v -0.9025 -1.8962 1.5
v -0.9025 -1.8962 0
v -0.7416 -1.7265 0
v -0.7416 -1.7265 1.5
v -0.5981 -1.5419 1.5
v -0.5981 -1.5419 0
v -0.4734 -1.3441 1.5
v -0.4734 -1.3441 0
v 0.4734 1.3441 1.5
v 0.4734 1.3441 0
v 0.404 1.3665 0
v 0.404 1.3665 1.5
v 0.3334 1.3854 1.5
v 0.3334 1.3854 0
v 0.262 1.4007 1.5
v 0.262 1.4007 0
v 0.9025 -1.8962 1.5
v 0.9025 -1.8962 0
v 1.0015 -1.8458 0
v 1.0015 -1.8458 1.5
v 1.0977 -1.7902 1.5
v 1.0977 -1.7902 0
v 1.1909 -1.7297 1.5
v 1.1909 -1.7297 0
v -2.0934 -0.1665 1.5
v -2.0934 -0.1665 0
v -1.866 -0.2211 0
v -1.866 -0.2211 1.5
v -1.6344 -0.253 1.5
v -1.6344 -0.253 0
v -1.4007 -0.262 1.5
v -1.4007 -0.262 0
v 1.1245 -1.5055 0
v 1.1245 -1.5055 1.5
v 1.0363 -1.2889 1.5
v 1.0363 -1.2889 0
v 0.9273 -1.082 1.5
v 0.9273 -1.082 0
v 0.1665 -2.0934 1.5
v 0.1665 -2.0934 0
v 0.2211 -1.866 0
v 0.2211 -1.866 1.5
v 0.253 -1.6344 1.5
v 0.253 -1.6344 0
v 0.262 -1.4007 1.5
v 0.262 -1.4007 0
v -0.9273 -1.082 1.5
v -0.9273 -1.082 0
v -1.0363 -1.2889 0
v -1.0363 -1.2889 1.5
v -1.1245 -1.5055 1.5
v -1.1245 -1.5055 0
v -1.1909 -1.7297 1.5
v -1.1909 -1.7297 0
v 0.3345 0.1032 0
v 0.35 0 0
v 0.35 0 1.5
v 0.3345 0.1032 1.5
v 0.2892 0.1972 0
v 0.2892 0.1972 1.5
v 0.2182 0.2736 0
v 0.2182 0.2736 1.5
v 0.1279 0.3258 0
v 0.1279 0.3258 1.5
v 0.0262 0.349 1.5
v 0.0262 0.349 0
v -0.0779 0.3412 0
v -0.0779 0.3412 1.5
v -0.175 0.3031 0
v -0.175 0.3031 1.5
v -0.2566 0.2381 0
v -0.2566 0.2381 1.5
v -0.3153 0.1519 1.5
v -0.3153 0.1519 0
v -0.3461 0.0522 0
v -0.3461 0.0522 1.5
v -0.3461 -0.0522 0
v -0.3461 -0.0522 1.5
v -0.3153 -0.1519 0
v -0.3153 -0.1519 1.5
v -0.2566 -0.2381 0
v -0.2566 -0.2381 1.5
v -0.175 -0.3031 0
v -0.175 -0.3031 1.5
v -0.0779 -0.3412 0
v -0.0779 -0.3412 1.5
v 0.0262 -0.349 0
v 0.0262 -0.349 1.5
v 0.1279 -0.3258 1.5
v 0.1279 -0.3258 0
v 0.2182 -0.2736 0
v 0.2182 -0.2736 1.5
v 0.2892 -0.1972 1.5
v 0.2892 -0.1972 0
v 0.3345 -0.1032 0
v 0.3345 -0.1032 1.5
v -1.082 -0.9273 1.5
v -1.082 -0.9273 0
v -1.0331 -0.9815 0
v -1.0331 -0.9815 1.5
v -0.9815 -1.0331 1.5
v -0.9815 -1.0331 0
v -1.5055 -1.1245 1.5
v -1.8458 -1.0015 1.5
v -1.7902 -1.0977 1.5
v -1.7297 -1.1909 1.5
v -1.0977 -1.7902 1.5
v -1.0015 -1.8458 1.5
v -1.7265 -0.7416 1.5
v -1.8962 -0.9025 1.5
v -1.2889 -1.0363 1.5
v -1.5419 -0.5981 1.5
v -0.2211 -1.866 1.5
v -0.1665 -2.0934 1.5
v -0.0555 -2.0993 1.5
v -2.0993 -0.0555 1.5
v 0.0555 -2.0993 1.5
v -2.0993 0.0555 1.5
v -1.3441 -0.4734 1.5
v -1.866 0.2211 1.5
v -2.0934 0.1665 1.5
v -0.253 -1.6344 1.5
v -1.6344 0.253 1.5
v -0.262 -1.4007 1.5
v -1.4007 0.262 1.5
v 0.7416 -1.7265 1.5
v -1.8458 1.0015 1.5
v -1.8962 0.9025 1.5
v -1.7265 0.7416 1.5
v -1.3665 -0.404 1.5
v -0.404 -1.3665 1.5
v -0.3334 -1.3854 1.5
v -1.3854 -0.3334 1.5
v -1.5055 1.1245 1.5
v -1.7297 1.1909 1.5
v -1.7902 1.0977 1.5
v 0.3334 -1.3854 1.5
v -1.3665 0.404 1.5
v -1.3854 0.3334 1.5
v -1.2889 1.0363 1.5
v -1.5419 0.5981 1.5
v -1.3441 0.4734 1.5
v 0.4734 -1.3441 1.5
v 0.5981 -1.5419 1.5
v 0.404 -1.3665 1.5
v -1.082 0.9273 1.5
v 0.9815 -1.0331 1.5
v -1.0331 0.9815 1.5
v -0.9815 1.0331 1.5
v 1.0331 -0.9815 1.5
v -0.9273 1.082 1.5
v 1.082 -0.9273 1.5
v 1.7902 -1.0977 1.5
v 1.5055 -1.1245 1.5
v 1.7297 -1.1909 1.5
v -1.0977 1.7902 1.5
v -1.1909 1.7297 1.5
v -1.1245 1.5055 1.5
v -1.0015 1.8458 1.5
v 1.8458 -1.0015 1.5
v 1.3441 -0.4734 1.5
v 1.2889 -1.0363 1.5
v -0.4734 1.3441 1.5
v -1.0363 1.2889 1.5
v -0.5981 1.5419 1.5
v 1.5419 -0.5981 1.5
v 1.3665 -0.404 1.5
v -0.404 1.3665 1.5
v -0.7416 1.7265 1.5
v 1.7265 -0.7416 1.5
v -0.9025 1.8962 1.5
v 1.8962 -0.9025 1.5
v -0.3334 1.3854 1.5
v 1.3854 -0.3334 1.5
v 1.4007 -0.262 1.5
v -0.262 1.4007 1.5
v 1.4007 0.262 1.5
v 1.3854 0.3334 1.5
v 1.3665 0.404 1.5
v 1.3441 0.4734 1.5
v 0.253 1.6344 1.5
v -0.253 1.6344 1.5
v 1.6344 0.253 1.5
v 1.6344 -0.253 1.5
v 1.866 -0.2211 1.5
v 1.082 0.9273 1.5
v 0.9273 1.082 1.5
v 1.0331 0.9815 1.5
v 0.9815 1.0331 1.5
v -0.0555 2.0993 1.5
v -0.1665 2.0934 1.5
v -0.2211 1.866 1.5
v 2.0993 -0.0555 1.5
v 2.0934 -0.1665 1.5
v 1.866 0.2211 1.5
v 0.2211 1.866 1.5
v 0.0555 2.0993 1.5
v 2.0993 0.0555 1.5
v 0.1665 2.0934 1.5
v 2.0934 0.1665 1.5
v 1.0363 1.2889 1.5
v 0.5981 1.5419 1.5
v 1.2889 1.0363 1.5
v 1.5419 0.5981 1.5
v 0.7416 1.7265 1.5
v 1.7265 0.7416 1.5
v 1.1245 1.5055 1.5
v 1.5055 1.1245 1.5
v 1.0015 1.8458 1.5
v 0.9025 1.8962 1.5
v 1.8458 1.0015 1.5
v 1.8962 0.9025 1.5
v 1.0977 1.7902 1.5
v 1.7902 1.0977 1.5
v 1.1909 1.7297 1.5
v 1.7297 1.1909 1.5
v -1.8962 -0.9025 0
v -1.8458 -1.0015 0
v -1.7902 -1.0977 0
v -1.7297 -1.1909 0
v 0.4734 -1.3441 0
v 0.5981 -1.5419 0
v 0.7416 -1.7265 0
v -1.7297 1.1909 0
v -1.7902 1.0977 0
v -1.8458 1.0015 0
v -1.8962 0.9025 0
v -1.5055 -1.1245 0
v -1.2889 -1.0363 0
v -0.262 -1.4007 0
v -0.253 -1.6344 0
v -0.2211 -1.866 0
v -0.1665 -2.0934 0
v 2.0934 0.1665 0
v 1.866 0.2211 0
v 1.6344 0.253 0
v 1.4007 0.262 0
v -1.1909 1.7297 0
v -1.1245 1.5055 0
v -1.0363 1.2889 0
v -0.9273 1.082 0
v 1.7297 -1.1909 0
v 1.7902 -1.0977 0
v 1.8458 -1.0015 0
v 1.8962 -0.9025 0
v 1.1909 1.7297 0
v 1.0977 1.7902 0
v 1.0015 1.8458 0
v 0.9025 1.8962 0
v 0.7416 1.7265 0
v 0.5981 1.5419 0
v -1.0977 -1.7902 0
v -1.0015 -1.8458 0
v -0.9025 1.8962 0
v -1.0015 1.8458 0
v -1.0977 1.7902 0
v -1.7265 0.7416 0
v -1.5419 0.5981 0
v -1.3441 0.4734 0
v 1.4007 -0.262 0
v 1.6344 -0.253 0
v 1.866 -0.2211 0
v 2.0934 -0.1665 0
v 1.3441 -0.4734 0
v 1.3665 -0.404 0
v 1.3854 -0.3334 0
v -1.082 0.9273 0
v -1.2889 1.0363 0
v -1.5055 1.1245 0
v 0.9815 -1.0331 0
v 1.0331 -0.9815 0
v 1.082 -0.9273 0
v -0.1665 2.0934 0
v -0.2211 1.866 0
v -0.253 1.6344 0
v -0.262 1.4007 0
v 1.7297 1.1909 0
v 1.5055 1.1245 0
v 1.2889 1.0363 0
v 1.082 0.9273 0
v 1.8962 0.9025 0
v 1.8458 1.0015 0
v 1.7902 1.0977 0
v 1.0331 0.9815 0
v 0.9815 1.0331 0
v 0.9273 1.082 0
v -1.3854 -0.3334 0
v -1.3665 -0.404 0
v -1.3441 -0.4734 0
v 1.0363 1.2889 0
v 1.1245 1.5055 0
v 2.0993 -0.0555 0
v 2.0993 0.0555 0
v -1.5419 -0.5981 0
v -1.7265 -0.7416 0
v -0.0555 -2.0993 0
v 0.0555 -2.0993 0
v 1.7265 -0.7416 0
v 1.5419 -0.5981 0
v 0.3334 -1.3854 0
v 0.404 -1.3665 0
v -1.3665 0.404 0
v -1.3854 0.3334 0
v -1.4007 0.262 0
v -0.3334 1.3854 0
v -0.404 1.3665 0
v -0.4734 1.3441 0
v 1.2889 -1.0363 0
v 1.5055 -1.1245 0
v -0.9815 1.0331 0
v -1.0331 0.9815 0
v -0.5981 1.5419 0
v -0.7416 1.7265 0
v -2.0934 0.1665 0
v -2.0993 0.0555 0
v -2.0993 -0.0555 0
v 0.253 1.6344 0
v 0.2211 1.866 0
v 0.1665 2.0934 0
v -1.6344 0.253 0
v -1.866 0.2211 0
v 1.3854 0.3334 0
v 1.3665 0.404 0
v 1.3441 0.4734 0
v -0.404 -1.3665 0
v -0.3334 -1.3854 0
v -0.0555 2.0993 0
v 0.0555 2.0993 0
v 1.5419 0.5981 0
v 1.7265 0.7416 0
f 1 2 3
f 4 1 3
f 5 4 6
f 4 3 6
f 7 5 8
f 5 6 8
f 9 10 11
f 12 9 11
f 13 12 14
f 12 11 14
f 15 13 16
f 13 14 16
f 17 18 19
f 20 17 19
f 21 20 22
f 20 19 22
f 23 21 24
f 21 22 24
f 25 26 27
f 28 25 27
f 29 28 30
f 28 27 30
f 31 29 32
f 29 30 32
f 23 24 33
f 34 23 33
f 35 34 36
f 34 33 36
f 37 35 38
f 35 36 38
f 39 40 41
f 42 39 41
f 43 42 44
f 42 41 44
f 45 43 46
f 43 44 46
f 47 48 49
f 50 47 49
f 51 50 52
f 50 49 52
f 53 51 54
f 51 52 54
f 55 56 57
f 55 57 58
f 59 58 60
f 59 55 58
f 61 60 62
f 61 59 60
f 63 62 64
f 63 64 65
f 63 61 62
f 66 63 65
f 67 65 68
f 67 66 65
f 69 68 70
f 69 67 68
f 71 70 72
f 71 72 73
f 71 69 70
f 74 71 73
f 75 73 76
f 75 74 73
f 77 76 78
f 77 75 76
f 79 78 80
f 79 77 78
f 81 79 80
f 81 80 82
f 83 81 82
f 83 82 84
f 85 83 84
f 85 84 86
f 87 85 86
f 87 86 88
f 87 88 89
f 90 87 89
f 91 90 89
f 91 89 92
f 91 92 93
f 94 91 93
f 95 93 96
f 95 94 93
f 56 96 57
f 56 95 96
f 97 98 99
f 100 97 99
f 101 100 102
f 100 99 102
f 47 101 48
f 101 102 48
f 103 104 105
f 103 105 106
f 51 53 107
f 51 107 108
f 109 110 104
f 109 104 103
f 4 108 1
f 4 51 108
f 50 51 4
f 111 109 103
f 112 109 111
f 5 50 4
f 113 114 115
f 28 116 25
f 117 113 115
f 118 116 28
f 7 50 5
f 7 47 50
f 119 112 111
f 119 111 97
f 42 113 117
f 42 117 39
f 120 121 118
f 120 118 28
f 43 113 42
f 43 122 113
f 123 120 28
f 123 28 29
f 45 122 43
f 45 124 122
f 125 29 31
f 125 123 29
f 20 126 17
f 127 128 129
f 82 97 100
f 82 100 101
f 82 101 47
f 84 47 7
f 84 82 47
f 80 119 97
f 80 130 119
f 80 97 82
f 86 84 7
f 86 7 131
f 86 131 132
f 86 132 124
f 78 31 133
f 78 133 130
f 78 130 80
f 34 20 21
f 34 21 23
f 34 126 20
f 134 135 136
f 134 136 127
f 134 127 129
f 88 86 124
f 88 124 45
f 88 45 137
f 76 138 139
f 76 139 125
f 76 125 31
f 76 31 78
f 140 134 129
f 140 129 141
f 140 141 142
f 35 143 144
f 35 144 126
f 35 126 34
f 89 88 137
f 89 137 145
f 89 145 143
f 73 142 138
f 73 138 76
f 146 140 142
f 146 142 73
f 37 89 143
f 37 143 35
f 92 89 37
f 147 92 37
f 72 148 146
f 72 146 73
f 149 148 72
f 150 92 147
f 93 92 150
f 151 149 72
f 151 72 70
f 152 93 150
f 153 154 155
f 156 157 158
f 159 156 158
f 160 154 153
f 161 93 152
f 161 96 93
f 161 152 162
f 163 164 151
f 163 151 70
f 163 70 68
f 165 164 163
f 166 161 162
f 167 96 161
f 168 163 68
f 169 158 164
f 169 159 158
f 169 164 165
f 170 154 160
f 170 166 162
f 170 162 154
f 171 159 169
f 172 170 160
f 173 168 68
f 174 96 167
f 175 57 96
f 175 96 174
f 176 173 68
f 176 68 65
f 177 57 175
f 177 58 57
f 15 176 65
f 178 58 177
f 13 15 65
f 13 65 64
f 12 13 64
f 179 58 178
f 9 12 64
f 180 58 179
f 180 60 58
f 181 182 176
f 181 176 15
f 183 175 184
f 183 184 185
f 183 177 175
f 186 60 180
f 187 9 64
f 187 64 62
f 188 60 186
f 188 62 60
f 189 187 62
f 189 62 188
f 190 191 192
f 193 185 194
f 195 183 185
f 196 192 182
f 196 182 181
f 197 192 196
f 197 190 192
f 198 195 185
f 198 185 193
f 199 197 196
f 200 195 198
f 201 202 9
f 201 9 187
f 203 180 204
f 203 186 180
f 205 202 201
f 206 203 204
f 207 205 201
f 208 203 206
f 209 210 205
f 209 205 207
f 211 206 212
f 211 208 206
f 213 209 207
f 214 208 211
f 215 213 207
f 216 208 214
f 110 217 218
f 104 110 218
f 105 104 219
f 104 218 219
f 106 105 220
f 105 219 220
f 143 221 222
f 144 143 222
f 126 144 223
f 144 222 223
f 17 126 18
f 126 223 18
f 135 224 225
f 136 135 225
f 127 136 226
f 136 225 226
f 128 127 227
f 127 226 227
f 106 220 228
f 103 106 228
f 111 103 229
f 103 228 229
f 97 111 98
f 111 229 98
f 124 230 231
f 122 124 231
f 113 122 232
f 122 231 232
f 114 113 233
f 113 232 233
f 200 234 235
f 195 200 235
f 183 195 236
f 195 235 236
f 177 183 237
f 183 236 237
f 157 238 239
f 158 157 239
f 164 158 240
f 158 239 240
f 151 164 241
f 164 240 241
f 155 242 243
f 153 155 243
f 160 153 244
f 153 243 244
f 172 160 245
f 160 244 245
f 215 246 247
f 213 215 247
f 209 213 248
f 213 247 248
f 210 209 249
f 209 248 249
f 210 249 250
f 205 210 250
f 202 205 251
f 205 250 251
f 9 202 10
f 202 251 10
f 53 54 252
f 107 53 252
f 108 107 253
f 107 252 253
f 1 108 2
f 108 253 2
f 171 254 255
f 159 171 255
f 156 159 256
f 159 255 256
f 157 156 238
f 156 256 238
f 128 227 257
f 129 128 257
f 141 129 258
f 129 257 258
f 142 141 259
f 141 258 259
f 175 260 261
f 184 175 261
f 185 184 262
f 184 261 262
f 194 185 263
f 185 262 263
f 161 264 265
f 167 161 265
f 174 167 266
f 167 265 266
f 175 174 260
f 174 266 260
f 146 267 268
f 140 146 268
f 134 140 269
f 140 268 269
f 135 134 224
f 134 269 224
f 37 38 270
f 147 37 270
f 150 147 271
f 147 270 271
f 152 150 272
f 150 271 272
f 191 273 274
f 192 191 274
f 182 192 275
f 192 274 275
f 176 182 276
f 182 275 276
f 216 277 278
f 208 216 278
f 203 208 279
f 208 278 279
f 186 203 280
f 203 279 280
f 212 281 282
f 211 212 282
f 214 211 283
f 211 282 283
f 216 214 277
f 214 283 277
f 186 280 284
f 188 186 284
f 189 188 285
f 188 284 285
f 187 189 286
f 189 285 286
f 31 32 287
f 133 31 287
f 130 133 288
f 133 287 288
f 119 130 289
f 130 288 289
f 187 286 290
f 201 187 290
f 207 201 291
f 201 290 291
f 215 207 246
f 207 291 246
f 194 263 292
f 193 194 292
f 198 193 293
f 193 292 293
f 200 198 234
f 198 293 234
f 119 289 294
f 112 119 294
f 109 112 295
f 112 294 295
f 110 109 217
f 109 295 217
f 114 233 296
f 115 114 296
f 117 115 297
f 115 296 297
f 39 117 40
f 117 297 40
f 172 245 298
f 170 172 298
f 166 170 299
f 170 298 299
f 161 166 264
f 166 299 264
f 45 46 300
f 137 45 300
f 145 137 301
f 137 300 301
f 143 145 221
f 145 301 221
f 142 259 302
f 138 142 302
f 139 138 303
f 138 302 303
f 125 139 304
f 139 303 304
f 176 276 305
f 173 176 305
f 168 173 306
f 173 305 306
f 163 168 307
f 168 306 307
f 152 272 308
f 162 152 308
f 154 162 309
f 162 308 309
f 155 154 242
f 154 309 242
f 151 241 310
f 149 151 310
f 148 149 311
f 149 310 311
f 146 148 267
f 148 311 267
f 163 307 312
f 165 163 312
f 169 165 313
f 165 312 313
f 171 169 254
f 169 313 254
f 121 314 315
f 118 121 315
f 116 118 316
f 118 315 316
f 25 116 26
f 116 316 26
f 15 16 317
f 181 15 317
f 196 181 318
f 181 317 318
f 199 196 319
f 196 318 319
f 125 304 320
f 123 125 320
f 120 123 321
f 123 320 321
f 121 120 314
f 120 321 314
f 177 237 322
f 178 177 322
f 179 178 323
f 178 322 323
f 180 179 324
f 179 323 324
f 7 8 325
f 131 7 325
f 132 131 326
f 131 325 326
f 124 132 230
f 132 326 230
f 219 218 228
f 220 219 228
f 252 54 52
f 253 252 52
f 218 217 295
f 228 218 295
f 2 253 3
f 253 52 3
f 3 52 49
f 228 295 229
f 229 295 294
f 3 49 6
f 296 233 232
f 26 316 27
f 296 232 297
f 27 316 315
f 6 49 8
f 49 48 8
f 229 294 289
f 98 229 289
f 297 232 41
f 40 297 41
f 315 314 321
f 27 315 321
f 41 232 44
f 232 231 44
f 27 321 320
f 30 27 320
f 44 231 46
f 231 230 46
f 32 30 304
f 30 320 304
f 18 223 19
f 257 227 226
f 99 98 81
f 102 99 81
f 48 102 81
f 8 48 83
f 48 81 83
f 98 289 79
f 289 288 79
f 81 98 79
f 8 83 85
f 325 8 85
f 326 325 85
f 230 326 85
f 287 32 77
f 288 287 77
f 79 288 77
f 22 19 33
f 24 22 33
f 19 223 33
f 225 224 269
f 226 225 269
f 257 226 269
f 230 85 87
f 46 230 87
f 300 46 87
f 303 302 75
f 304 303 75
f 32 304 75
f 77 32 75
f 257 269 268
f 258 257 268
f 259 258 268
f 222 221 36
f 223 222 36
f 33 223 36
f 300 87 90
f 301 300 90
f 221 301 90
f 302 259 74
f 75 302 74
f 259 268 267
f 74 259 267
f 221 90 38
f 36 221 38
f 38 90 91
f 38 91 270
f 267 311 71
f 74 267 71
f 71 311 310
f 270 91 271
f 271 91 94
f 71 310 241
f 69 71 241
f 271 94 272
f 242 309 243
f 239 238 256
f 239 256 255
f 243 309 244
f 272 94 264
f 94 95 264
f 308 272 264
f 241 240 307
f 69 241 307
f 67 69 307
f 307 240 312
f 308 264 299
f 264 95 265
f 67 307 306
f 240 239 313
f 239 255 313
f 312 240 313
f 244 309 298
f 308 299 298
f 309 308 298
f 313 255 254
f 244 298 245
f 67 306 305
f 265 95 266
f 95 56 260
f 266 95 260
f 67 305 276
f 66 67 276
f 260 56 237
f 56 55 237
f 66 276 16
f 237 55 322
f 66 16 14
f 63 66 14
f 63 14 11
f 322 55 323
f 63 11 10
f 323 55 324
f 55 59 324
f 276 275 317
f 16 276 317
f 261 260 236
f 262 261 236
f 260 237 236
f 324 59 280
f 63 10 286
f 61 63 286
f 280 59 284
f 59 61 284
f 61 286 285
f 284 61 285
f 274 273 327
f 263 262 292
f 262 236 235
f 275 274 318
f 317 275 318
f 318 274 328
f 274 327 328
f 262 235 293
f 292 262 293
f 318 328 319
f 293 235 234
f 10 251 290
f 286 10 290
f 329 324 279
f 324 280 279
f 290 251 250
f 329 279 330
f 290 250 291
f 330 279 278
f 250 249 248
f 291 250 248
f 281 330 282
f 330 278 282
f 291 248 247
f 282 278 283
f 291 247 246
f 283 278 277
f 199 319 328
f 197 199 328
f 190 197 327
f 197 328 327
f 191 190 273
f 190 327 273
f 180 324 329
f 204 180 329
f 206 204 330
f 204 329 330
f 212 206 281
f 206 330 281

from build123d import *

# Parameters (mm, degrees)
SKETCH_1_R      = 0.35
EXTRUDE_1_DEPTH = 1.5


with BuildPart() as part:
    # 스케치1 → 보스-돌출1 (new body)
    with BuildSketch(Plane.XY):
        with BuildLine():
            ThreePointArc((-0.166490254, 2.093389834), (-0.239891186, 1.750579573), (-0.262040986, 1.400699654))
            ThreePointArc((-0.262040986, 1.400699654), (-0.368817139, 1.376444302), (-0.473415677, 1.344061977))
            ThreePointArc((-0.473415677, 1.344061977), (-0.667537925, 1.635991975), (-0.902510127, 1.896173903))
            ThreePointArc((-0.902510127, 1.896173903), (-1.05, 1.818653348), (-1.190879707, 1.729683649))
            ThreePointArc((-1.190879707, 1.729683649), (-1.083041648, 1.396100789), (-0.927283978, 1.082020991))
            ThreePointArc((-0.927283978, 1.082020991), (-1.007627163, 1.007627163), (-1.082020991, 0.927283978))
            ThreePointArc((-1.082020991, 0.927283978), (-1.396100789, 1.083041648), (-1.729683649, 1.190879707))
            ThreePointArc((-1.729683649, 1.190879707), (-1.818653348, 1.05), (-1.896173903, 0.902510127))
            ThreePointArc((-1.896173903, 0.902510127), (-1.635991975, 0.667537925), (-1.344061977, 0.473415677))
            ThreePointArc((-1.344061977, 0.473415677), (-1.376444302, 0.368817139), (-1.400699654, 0.262040986))
            ThreePointArc((-1.400699654, 0.262040986), (-1.750579573, 0.239891186), (-2.093389834, 0.166490254))
            ThreePointArc((-2.093389834, 0.166490254), (-2.1, 0), (-2.093389834, -0.166490254))
            ThreePointArc((-2.093389834, -0.166490254), (-1.750579573, -0.239891186), (-1.400699654, -0.262040986))
            ThreePointArc((-1.400699654, -0.262040986), (-1.376444302, -0.368817139), (-1.344061977, -0.473415677))
            ThreePointArc((-1.344061977, -0.473415677), (-1.635991975, -0.667537925), (-1.896173903, -0.902510127))
            ThreePointArc((-1.896173903, -0.902510127), (-1.818653348, -1.05), (-1.729683649, -1.190879707))
            ThreePointArc((-1.729683649, -1.190879707), (-1.396100789, -1.083041648), (-1.082020991, -0.927283978))
            ThreePointArc((-1.082020991, -0.927283978), (-1.007627163, -1.007627163), (-0.927283978, -1.082020991))
            ThreePointArc((-0.927283978, -1.082020991), (-1.083041648, -1.396100789), (-1.190879707, -1.729683649))
            ThreePointArc((-1.190879707, -1.729683649), (-1.05, -1.818653348), (-0.902510127, -1.896173903))
            ThreePointArc((-0.902510127, -1.896173903), (-0.667537925, -1.635991975), (-0.473415677, -1.344061977))
            ThreePointArc((-0.473415677, -1.344061977), (-0.368817139, -1.376444302), (-0.262040986, -1.400699654))
            ThreePointArc((-0.262040986, -1.400699654), (-0.239891186, -1.750579573), (-0.166490254, -2.093389834))
            ThreePointArc((-0.166490254, -2.093389834), (0, -2.1), (0.166490254, -2.093389834))
            ThreePointArc((0.166490254, -2.093389834), (0.239891186, -1.750579573), (0.262040986, -1.400699654))
            ThreePointArc((0.262040986, -1.400699654), (0.368817139, -1.376444302), (0.473415677, -1.344061977))
            ThreePointArc((0.473415677, -1.344061977), (0.667537925, -1.635991975), (0.902510127, -1.896173903))
            ThreePointArc((0.902510127, -1.896173903), (1.05, -1.818653348), (1.190879707, -1.729683649))
            ThreePointArc((1.190879707, -1.729683649), (1.083041648, -1.396100789), (0.927283978, -1.082020991))
            ThreePointArc((0.927283978, -1.082020991), (1.007627163, -1.007627163), (1.082020991, -0.927283978))
            ThreePointArc((1.082020991, -0.927283978), (1.396100789, -1.083041648), (1.729683649, -1.190879707))
            ThreePointArc((1.729683649, -1.190879707), (1.818653348, -1.05), (1.896173903, -0.902510127))
            ThreePointArc((1.896173903, -0.902510127), (1.635991975, -0.667537925), (1.344061977, -0.473415677))
            ThreePointArc((1.344061977, -0.473415677), (1.376444302, -0.368817139), (1.400699654, -0.262040986))
            ThreePointArc((1.400699654, -0.262040986), (1.750579573, -0.239891186), (2.093389834, -0.166490254))
            ThreePointArc((2.093389834, -0.166490254), (2.1, 0), (2.093389834, 0.166490254))
            ThreePointArc((2.093389834, 0.166490254), (1.750579573, 0.239891186), (1.400699654, 0.262040986))
            ThreePointArc((1.400699654, 0.262040986), (1.376444302, 0.368817139), (1.344061977, 0.473415677))
            ThreePointArc((1.344061977, 0.473415677), (1.635991975, 0.667537925), (1.896173903, 0.902510127))
            ThreePointArc((1.896173903, 0.902510127), (1.818653348, 1.05), (1.729683649, 1.190879707))
            ThreePointArc((1.729683649, 1.190879707), (1.396100789, 1.083041648), (1.082020991, 0.927283978))
            ThreePointArc((1.082020991, 0.927283978), (1.007627163, 1.007627163), (0.927283978, 1.082020991))
            ThreePointArc((0.927283978, 1.082020991), (1.083041648, 1.396100789), (1.190879707, 1.729683649))
            ThreePointArc((1.190879707, 1.729683649), (1.05, 1.818653348), (0.902510127, 1.896173903))
            ThreePointArc((0.902510127, 1.896173903), (0.667537925, 1.635991975), (0.473415677, 1.344061977))
            ThreePointArc((0.473415677, 1.344061977), (0.368817139, 1.376444302), (0.262040986, 1.400699654))
            ThreePointArc((0.262040986, 1.400699654), (0.239891186, 1.750579573), (0.166490254, 2.093389834))
            ThreePointArc((0.166490254, 2.093389834), (0, 2.1), (-0.166490254, 2.093389834))
        make_face()
        Circle(SKETCH_1_R, mode=Mode.SUBTRACT)
    extrude(amount=EXTRUDE_1_DEPTH)


solid = part.part
